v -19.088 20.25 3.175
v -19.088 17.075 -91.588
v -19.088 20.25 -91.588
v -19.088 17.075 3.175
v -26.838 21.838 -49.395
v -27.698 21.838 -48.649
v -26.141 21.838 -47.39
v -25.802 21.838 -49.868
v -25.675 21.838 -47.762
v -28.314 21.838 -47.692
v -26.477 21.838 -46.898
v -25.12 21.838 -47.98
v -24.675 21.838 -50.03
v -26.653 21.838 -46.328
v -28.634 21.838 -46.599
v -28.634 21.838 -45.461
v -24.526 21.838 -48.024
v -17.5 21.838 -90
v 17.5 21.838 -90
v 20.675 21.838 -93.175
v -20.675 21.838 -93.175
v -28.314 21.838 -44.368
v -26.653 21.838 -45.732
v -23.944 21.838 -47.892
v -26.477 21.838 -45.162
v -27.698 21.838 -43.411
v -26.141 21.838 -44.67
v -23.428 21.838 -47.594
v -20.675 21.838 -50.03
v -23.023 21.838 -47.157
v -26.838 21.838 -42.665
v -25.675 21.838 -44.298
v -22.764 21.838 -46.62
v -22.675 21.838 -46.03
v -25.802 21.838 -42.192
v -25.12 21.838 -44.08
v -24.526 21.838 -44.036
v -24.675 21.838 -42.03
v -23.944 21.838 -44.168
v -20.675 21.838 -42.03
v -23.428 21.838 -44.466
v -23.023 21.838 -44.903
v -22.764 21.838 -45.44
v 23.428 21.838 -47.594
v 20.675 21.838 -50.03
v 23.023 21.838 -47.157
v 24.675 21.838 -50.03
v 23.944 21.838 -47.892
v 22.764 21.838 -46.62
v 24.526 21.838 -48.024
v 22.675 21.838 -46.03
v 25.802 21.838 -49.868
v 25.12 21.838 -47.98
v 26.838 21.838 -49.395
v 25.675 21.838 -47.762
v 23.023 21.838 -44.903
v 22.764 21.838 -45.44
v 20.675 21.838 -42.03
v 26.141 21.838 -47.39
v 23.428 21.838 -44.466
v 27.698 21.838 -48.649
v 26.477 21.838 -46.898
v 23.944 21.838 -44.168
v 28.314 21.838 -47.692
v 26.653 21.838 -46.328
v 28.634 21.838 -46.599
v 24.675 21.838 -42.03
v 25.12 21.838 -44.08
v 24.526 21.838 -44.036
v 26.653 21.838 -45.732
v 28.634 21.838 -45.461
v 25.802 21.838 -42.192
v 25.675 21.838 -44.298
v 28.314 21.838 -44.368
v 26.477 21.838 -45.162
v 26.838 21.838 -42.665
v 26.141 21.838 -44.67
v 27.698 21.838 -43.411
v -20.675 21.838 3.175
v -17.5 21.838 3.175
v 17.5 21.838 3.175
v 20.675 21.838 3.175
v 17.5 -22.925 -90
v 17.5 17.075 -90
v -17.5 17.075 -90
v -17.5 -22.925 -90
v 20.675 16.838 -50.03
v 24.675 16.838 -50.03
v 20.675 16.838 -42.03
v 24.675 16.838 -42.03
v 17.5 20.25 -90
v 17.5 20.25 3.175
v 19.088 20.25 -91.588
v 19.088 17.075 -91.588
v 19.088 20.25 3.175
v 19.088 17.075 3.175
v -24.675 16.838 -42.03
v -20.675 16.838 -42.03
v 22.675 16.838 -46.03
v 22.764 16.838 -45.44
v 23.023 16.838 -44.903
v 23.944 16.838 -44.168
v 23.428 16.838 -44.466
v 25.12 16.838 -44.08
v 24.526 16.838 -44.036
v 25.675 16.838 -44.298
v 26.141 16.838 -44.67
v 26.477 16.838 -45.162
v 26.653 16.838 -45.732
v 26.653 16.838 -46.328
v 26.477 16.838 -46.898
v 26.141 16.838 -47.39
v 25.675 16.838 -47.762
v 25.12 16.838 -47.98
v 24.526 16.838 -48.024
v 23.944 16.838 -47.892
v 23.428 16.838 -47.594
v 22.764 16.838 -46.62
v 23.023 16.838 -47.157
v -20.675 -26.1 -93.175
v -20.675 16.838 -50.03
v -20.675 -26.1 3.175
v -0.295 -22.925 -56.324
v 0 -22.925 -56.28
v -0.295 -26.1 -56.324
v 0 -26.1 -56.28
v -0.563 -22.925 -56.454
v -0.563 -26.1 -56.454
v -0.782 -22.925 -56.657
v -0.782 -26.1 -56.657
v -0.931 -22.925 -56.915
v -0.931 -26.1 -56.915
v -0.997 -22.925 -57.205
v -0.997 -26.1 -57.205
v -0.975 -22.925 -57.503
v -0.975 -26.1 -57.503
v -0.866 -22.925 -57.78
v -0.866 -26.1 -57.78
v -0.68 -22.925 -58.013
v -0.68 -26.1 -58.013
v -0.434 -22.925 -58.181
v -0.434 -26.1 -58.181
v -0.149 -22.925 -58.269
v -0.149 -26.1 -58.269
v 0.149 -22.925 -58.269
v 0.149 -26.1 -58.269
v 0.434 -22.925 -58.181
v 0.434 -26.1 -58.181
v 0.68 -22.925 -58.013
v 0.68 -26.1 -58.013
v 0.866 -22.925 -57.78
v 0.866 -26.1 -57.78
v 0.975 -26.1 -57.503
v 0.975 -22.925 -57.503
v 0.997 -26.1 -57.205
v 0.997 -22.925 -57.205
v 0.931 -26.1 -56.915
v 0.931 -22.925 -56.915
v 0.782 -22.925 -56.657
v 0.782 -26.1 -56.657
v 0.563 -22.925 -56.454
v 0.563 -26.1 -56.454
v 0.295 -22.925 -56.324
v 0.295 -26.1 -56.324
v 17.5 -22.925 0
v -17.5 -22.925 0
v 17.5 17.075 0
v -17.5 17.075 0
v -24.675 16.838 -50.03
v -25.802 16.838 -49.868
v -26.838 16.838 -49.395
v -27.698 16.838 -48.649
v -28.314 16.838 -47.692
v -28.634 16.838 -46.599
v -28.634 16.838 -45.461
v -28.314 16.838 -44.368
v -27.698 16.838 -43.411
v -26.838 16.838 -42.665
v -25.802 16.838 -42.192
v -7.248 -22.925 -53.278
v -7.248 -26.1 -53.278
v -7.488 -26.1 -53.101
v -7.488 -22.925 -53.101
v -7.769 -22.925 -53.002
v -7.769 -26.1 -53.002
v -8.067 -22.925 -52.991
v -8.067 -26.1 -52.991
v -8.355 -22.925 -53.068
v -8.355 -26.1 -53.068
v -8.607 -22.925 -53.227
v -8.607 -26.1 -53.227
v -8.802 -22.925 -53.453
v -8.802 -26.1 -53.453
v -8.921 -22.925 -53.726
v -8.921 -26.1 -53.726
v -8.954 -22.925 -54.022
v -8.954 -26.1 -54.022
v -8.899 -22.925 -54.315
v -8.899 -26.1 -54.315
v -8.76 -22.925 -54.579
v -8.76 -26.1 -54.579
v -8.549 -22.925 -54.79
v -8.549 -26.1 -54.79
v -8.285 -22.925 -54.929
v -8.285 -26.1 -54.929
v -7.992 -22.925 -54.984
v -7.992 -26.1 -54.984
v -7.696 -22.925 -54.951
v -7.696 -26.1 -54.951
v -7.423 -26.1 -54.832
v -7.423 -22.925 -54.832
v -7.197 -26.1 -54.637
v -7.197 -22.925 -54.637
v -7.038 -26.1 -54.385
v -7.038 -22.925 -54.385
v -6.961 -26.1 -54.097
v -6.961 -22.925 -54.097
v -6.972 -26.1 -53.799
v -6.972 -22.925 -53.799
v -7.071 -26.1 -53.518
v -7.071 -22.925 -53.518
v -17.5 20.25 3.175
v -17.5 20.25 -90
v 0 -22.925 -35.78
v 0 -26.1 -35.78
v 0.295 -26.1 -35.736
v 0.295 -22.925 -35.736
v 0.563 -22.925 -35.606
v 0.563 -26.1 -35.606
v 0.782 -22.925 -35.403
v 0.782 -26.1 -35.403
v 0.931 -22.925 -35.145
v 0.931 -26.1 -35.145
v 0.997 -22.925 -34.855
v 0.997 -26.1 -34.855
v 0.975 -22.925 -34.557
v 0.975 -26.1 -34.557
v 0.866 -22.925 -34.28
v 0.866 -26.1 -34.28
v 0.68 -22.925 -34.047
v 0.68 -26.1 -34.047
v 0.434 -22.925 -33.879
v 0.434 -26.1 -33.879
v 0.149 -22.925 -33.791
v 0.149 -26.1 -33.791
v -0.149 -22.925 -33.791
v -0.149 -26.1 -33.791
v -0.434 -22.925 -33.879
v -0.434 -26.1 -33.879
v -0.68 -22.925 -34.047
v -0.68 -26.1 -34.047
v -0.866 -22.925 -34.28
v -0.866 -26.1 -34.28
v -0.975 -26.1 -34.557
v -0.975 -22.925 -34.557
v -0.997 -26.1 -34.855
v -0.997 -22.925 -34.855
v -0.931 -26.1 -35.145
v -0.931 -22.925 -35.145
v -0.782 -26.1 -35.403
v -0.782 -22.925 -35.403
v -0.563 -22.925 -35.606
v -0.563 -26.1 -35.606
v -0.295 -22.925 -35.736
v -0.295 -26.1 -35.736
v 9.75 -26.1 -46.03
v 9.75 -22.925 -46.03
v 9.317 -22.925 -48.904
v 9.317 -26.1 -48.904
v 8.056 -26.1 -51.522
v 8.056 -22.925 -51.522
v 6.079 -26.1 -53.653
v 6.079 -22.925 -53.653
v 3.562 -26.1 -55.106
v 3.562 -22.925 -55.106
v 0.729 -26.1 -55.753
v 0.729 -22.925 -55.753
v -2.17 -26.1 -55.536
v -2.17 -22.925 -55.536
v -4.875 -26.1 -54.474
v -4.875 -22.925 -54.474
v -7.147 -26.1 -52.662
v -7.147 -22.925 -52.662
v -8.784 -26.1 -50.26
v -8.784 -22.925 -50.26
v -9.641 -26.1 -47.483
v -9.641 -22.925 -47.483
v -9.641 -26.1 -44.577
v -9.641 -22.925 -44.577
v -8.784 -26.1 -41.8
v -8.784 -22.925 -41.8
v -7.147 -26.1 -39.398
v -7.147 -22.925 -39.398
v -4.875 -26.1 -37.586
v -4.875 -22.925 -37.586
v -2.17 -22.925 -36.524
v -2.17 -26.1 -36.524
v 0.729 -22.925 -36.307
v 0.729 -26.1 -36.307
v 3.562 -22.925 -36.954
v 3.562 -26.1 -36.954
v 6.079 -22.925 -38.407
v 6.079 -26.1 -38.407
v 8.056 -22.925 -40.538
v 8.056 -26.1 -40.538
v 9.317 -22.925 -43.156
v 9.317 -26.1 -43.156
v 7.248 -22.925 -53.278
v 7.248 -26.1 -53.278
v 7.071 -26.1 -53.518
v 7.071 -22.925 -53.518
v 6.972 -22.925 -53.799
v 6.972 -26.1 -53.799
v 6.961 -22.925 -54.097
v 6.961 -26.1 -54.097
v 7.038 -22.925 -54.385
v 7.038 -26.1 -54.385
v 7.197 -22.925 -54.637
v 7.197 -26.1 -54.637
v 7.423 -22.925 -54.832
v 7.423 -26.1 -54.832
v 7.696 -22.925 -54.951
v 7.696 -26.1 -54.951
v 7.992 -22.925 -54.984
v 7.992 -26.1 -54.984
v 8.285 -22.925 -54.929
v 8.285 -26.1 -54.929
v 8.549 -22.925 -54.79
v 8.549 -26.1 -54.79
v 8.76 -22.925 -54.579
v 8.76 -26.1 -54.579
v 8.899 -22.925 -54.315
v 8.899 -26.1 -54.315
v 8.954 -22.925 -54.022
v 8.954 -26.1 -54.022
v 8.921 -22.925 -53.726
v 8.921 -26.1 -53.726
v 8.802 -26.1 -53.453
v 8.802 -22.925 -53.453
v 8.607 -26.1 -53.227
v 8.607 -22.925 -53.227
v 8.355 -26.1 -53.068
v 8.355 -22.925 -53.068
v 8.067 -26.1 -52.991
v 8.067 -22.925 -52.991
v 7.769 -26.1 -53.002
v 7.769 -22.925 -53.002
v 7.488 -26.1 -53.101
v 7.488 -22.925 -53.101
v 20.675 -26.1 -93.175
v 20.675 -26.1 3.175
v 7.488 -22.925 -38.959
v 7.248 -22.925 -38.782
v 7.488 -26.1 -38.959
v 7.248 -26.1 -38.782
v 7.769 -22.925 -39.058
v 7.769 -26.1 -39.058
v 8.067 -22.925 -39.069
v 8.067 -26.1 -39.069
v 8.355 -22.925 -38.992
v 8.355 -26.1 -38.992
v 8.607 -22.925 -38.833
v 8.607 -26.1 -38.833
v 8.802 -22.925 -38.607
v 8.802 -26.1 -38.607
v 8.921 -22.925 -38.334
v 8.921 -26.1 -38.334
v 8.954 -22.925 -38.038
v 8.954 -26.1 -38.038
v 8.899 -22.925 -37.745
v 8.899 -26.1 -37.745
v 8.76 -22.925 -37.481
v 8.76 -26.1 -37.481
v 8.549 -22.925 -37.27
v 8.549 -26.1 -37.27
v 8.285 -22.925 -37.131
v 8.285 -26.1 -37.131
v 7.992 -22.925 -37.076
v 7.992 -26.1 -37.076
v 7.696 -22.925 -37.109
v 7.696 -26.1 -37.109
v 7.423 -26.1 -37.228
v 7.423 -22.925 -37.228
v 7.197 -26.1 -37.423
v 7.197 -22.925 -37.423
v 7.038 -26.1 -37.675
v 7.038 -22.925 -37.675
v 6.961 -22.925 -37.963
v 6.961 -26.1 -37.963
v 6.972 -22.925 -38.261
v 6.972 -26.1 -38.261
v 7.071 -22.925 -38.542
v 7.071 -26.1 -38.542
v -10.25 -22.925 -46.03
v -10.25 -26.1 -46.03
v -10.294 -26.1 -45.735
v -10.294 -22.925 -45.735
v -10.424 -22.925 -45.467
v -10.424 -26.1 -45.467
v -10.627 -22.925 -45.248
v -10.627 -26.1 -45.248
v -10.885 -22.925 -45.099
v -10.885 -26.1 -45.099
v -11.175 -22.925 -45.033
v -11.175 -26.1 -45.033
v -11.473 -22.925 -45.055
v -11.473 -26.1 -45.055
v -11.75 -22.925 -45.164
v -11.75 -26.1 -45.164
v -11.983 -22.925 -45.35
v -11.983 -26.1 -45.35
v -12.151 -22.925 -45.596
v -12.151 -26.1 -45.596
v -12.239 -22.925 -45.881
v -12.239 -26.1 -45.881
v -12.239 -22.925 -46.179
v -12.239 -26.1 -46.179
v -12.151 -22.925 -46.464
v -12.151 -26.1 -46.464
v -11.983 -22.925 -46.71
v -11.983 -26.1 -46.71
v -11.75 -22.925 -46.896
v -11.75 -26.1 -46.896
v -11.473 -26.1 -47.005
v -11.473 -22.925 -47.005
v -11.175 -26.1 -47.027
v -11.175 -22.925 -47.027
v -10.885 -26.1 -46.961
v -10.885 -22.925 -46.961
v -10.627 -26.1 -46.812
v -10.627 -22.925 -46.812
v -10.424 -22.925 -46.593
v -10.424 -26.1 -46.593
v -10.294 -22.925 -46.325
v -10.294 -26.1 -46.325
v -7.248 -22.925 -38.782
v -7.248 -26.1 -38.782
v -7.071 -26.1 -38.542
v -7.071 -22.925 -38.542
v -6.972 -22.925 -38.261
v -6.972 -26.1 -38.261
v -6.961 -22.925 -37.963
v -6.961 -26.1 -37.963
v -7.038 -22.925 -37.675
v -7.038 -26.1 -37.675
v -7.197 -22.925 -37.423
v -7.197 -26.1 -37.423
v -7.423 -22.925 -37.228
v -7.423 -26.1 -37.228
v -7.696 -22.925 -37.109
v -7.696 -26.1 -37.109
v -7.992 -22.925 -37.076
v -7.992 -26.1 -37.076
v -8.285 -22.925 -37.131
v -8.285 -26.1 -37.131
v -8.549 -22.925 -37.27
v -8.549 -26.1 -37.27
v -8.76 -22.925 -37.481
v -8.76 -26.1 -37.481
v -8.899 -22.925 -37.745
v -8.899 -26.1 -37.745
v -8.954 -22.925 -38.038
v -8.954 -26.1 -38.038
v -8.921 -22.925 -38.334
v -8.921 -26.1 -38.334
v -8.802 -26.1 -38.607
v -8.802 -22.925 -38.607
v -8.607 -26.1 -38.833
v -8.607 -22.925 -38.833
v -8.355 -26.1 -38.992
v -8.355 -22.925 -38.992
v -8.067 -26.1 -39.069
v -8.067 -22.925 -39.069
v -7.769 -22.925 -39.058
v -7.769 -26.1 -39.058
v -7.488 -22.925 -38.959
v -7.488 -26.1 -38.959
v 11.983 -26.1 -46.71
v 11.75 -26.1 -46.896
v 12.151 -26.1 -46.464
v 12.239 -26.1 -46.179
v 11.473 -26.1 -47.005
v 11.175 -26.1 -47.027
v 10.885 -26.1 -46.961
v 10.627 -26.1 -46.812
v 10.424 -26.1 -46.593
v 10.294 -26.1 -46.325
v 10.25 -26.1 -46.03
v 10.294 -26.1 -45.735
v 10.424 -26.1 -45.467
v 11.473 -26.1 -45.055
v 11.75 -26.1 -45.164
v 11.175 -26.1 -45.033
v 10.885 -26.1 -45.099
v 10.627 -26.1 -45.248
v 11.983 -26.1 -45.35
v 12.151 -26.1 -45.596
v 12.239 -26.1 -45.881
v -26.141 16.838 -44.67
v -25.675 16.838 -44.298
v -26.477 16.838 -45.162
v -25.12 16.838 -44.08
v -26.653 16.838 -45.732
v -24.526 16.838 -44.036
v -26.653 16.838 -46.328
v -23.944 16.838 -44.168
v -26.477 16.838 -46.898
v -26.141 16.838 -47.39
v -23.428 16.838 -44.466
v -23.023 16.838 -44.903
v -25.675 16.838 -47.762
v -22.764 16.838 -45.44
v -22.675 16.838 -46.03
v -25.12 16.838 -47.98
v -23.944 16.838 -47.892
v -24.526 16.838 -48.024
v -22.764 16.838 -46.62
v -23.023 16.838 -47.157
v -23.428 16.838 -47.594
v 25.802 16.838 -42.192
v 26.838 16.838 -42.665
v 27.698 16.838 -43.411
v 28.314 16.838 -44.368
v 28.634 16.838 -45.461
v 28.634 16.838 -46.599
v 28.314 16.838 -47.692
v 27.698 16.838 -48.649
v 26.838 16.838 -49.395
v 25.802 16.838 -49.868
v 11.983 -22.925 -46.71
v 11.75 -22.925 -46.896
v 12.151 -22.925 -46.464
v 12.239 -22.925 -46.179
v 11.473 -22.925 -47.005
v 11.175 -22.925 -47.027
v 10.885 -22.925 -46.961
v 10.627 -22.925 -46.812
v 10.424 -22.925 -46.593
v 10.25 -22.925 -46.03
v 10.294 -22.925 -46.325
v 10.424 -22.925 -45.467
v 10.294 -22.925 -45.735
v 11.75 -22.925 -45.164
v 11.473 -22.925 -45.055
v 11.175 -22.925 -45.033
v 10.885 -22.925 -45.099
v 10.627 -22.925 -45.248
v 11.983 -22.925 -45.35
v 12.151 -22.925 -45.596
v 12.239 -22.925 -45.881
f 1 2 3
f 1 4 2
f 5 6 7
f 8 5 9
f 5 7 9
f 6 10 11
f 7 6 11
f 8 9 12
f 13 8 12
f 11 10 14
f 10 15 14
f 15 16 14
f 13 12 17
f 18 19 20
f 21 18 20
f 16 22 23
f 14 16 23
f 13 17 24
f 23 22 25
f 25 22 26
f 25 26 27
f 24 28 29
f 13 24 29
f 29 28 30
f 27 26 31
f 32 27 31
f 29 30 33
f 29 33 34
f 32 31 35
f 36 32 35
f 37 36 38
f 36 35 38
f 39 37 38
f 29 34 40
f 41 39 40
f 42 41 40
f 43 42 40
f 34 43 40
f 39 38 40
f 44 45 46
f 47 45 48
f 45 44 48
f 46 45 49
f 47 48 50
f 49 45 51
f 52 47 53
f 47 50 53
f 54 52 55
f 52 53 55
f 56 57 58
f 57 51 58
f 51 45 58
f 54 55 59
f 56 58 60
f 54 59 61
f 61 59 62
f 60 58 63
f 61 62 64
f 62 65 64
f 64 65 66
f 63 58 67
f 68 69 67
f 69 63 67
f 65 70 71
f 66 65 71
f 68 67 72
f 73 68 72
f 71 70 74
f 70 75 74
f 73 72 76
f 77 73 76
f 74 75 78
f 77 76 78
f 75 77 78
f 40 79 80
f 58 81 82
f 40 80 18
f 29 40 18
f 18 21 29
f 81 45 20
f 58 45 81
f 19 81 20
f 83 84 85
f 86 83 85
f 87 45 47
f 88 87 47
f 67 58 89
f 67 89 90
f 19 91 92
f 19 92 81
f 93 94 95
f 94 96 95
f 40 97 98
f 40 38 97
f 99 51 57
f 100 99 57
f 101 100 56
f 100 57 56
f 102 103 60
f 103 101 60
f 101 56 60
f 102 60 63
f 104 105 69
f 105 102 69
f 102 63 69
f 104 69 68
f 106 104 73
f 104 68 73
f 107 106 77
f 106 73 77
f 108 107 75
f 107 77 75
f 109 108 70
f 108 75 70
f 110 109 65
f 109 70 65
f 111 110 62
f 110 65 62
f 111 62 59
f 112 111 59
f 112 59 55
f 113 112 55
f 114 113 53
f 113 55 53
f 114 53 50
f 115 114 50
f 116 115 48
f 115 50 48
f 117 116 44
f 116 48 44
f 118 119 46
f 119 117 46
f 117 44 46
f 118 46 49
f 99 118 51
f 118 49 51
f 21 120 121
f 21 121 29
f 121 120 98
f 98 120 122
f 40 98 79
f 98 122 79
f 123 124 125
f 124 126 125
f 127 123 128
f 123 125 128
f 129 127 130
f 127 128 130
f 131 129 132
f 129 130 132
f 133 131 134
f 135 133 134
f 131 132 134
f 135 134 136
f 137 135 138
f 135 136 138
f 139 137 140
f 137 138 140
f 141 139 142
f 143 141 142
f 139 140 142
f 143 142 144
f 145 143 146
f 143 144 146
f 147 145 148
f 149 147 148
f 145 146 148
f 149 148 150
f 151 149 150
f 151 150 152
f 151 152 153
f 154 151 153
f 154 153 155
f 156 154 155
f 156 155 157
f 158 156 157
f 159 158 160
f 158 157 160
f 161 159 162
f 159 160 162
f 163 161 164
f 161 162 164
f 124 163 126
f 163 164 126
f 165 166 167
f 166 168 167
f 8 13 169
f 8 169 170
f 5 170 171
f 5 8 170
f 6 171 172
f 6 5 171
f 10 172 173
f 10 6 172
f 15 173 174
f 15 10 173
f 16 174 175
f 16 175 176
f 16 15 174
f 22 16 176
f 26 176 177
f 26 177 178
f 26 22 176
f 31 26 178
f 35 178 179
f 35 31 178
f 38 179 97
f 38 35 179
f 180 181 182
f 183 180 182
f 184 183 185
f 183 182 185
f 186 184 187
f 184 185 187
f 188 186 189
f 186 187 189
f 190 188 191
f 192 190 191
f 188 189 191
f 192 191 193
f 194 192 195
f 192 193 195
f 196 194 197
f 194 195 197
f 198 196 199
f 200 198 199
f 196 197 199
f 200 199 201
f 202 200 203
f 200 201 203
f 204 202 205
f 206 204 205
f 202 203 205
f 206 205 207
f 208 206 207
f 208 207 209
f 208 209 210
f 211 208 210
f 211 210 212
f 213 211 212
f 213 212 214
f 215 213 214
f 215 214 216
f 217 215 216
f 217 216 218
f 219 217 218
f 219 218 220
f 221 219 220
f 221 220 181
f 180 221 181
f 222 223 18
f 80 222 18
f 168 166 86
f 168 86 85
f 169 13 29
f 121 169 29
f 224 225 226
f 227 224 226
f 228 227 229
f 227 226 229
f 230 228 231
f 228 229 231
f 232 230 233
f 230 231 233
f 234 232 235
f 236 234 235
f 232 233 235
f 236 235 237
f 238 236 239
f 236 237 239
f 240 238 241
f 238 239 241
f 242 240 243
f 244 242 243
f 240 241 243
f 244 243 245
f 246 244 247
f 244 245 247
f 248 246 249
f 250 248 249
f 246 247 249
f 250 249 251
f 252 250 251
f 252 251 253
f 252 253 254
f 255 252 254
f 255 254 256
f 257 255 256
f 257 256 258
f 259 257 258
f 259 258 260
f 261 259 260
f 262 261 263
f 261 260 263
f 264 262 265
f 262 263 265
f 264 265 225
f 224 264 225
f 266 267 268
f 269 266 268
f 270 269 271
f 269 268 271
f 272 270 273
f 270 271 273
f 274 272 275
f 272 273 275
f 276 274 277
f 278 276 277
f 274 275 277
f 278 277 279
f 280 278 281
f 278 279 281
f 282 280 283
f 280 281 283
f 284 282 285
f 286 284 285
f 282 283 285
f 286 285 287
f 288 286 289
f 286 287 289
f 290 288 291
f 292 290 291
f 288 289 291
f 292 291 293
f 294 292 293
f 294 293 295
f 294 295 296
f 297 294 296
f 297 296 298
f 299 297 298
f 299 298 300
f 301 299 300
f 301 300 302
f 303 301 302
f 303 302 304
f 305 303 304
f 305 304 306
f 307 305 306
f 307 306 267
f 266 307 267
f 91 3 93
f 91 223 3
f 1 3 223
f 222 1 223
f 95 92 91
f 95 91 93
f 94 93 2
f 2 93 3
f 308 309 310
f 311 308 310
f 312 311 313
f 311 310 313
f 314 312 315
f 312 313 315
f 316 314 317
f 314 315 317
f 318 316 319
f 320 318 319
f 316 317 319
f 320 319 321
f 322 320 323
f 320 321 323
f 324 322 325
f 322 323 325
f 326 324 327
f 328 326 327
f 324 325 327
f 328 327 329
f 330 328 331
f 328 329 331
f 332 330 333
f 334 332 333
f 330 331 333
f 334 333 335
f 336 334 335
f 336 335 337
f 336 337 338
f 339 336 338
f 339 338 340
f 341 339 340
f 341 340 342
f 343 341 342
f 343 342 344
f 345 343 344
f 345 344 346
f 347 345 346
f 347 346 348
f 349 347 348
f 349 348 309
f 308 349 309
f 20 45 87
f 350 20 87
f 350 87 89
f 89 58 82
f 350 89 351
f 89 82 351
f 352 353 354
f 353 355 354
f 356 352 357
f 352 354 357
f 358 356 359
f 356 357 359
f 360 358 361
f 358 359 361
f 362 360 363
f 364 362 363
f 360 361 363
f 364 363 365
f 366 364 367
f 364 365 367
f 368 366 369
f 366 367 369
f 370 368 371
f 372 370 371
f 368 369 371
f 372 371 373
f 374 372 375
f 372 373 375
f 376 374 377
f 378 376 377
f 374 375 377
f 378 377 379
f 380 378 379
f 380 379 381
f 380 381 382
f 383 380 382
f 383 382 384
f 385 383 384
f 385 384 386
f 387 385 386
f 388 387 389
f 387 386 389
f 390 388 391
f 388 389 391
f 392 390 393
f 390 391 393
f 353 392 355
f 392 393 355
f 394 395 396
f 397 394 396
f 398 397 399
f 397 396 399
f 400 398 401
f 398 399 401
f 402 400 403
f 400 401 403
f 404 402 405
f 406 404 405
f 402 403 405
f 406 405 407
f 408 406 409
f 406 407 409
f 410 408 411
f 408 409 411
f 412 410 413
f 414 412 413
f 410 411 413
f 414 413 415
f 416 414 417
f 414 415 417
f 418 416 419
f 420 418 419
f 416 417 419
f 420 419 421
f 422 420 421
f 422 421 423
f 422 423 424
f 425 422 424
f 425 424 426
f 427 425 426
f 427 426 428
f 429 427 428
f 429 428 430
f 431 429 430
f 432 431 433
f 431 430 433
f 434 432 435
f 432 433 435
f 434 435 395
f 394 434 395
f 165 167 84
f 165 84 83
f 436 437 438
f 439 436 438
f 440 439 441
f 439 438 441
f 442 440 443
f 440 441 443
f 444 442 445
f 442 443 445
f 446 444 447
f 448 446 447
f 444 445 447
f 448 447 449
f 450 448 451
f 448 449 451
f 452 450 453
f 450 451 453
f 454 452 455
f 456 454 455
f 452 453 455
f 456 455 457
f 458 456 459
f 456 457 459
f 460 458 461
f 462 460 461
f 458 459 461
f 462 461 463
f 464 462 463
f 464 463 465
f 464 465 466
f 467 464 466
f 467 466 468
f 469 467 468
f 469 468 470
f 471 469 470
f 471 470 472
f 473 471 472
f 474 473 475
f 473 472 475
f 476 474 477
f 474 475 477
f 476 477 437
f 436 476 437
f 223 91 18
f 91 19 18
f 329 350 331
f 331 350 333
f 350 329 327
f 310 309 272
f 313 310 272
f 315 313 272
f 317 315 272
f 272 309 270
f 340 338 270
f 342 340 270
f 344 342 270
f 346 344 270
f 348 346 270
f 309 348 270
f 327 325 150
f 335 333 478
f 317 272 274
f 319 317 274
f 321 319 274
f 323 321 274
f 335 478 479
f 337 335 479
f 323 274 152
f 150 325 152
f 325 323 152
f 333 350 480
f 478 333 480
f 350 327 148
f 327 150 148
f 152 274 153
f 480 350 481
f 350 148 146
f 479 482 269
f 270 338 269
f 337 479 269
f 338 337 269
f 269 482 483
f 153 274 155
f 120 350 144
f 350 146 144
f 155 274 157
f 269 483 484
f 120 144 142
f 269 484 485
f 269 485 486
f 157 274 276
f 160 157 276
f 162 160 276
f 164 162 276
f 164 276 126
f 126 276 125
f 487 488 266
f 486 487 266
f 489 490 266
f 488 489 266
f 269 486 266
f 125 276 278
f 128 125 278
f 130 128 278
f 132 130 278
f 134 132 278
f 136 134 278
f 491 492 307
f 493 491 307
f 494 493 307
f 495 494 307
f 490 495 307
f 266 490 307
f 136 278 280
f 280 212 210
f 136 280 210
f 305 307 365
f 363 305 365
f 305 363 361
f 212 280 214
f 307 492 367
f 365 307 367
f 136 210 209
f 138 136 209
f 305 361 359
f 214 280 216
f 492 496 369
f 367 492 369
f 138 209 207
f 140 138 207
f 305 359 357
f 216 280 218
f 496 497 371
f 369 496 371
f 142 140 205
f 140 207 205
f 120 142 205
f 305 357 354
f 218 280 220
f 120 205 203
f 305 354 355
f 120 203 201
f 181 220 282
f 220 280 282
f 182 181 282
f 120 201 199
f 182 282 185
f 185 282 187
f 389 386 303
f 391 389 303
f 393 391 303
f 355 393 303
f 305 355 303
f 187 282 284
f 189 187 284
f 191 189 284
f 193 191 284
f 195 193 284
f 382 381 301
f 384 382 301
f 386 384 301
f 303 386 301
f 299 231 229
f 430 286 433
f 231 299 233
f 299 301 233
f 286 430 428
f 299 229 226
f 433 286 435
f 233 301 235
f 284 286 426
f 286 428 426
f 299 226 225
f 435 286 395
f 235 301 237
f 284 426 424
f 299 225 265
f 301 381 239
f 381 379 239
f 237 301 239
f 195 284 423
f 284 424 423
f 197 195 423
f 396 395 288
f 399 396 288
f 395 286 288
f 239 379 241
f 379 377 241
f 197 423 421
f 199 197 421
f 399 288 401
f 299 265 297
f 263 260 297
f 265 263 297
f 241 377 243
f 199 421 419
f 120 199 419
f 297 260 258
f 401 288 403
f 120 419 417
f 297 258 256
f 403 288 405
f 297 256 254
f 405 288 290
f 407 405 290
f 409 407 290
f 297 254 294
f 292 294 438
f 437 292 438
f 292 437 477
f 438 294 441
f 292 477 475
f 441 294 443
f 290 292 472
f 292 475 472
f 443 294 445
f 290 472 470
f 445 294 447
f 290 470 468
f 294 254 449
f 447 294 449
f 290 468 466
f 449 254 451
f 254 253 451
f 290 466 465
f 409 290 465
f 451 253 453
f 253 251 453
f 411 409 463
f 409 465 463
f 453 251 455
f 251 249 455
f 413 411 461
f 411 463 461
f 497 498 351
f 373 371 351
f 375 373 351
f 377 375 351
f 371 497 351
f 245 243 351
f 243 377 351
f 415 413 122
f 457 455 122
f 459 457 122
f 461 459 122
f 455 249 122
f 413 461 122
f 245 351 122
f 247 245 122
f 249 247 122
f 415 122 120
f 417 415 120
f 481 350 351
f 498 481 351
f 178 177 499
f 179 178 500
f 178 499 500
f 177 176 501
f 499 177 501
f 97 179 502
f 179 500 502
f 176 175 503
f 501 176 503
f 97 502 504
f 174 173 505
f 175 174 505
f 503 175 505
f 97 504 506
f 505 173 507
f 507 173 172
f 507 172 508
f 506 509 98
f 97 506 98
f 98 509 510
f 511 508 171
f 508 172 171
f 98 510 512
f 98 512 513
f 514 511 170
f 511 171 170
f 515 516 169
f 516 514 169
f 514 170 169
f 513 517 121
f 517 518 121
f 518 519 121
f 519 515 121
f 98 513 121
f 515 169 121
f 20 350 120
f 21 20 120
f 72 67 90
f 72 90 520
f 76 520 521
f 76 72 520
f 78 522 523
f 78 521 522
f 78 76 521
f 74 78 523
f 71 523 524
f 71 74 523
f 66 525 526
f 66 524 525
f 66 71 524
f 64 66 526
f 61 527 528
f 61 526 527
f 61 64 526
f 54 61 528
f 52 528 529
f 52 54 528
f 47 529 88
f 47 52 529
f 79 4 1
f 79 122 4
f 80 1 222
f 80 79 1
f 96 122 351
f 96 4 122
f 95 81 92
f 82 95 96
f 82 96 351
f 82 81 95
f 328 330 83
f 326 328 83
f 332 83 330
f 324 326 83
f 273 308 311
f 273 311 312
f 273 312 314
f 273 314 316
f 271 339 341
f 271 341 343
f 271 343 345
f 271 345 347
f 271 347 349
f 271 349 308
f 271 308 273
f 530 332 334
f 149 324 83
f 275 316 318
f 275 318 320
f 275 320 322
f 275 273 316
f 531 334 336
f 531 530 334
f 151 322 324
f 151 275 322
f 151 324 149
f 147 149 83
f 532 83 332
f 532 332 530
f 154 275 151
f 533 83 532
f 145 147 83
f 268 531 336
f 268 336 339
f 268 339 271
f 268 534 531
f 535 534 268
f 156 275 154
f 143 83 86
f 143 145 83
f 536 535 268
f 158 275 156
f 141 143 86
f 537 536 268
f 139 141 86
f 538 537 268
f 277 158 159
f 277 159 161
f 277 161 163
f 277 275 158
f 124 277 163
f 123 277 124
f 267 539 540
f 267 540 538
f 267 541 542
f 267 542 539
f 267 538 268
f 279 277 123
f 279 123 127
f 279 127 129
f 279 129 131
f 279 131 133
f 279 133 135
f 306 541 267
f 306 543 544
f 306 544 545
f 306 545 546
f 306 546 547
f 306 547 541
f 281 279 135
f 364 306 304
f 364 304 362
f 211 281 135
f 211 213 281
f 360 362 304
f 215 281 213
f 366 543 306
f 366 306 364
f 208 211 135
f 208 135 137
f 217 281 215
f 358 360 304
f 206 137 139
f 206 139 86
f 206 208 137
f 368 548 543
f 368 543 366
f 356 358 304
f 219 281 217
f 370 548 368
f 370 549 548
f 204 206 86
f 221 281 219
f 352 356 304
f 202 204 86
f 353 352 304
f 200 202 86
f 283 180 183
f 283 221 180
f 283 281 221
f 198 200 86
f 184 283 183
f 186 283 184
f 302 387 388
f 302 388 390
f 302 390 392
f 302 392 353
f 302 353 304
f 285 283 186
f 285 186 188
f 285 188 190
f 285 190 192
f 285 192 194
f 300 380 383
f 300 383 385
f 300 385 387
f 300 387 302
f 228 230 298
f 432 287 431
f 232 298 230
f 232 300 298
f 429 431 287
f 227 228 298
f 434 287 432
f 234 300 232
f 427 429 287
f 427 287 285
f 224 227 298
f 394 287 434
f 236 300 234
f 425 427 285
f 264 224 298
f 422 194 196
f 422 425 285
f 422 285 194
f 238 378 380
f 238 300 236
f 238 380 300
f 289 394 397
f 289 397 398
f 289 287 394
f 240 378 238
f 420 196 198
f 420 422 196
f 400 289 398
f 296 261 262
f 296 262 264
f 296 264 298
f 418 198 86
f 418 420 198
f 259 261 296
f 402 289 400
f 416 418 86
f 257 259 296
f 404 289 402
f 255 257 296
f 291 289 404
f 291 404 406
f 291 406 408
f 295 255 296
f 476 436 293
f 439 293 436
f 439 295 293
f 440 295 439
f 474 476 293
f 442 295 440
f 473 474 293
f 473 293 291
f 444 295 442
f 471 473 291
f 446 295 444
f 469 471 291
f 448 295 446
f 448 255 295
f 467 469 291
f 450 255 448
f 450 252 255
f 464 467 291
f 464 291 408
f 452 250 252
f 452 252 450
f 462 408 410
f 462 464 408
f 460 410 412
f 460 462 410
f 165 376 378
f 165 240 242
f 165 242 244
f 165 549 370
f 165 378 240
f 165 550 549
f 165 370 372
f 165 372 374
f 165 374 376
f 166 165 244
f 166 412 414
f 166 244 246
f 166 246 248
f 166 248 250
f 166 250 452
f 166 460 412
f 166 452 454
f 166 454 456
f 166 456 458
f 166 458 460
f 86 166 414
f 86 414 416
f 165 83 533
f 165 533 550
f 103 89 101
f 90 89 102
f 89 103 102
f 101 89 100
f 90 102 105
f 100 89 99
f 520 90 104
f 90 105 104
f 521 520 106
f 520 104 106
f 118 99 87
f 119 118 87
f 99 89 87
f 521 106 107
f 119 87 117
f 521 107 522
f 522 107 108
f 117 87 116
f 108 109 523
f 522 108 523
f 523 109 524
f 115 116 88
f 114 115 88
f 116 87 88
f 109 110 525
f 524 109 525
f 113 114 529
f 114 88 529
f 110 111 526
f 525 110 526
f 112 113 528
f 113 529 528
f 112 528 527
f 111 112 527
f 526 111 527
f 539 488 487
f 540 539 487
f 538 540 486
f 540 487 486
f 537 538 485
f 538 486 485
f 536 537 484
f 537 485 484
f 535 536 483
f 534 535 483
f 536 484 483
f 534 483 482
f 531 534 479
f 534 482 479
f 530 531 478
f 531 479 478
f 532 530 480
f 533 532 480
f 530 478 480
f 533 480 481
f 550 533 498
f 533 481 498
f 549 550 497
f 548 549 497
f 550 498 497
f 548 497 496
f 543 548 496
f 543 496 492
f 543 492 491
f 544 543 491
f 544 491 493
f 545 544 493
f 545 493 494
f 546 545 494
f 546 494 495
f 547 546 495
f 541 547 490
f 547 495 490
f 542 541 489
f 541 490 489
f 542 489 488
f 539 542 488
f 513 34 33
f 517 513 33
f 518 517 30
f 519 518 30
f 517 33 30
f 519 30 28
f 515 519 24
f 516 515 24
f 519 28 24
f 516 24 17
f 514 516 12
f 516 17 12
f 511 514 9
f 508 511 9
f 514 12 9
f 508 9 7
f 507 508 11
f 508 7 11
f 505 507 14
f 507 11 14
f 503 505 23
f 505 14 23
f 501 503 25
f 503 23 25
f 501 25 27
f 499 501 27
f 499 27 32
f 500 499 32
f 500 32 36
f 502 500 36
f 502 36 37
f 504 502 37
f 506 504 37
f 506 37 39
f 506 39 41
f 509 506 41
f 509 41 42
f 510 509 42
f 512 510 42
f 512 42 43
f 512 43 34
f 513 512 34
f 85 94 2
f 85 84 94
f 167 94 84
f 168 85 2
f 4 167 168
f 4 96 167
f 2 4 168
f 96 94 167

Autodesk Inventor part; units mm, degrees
ref_plane "YZ Plane" through (0, 0, 0) normal (1, 0, 0) x (0, 1, 0)
sketch "Sketch1" plane through (0, 0, 0) normal (0, 0, 1) x (1, 0, 0)
  circle A0 centre (0, 0) radius 14.925 construction
  line L0 (-5.7359, -22.925) -> (4.2584, -22.925) construction
  line L1 (0, -14.925) -> (3.9694, -14.925) construction
  line L2 (-17.5, 17.075) -> (17.5, 17.075)
  line L3 (17.5, 17.075) -> (17.5, -22.925)
  line L4 (17.5, -22.925) -> (-17.5, -22.925)
  line L5 (-17.5, -22.925) -> (-17.5, 17.075)
  line L6 (0, 31.425) -> (0, -35.6875) projected
  line L7 (20.675, 21.8375) -> (20.675, -26.1)
  line L8 (20.675, -26.1) -> (-20.675, -26.1)
  line L9 (-20.675, -26.1) -> (-20.675, 21.8375)
  line L10 (-17.5, 17.075) -> (-19.0875, 17.075)
  line L11 (-19.0875, 17.075) -> (-19.0875, 20.25)
  line L12 (17.5, 17.075) -> (19.0875, 17.075)
  line L13 (19.0875, 17.075) -> (19.0875, 20.25)
  line L14 (17.5, 20.25) -> (17.5, 21.8375)
  line L15 (-17.5, 20.25) -> (-17.5, 21.8375)
  line L16 (-19.0875, 20.25) -> (-17.5, 20.25)
  line L17 (-17.5, 21.8375) -> (-20.675, 21.8375)
  line L18 (19.0875, 20.25) -> (17.5, 20.25)
  line L19 (17.5, 21.8375) -> (20.675, 21.8375)
  line L20 (-17.5, 21.8375) -> (17.5, 21.8375)
  dimension "d0" = 29.85
  dimension "d1" = 8
  dimension "d2" = 40
  dimension "d3" = 35
  dimension "d5" = 3.175
  dimension "d6" = 3.175
  dimension "d7" = 3.175
  dimension "d10" = 3.175
  dimension "d11" = 1.5875
  dimension "d12" = 1.5875
extrude "Extrusion1" add sketch "Sketch1" against normal blind 90 contours L5 L4 L6 L8 L9 L17 L15 L16 L11 L10 | L12 L13 L18 L14 L19 L7 L8 L6 L4 L3
extrude "Extrusion2" add sketch "Sketch1" along normal blind 3.175 contours L2 L6 L4 L5 | L5 L4 L6 L8 L9 L17 L15 L16 L11 L10 | L2 L3 L4 L6 | L12 L13 L18 L14 L19 L7 L8 L6 L4 L3
sketch "Sketch2" plane through (0, 0, -90) normal (0, 0, -1) x (-1, 0, 0)
  line L0 (19.0875, 17.075) -> (17.5, 17.075) projected
  line L1 (17.5, 17.075) -> (17.5, -22.925) projected
  line L2 (17.5, -22.925) -> (-17.5, -22.925) projected
  line L3 (-17.5, -22.925) -> (-17.5, 17.075) projected
  line L4 (-17.5, 17.075) -> (-19.0875, 17.075) projected
  line L5 (-19.0875, 17.075) -> (-19.0875, 20.25) projected
  line L6 (-19.0875, 20.25) -> (-17.5, 20.25) projected
  line L7 (-17.5, 20.25) -> (-17.5, 21.8375) projected
  line L8 (-17.5, 21.8375) -> (-20.675, 21.8375) projected
  line L9 (-20.675, 21.8375) -> (-20.675, -26.1) projected
  line L10 (-20.675, -26.1) -> (20.675, -26.1) projected
  line L11 (20.675, -26.1) -> (20.675, 21.8375) projected
  line L12 (20.675, 21.8375) -> (17.5, 21.8375) projected
  line L13 (17.5, 21.8375) -> (17.5, 20.25) projected
  line L14 (17.5, 20.25) -> (19.0875, 20.25) projected
  line L15 (19.0875, 20.25) -> (19.0875, 17.075) projected
  line L16 (-17.5, 21.8375) -> (17.5, 21.8375)
  line L17 (-17.5, 20.25) -> (17.5, 20.25)
  line L18 (-17.5, 17.075) -> (17.5, 17.075)
  point P0 (0, 0)
extrude "Extrusion3" add sketch "Sketch2" along normal blind 3.175
extrude "Extrusion4" cut sketch "Sketch2" along normal blind 1.5875 contours L0 L18 L4 L5 L6 L17 L14 L15
sketch "Sketch3" plane through (-17.5, -22.925, 0) normal (0, 1, 0) x (1, 0, 0)
  line L0 (-3.175, 93.175) -> (-3.175, -3.175) projected
  line L1 (38.175, 93.175) -> (-3.175, 93.175) projected
  line L2 (38.175, 93.175) -> (38.175, -3.175) projected
  line L3 (-3.175, -3.175) -> (38.175, -3.175) projected
  line L4 (-3.175, 93.175) -> (-3.175, -3.175) construction
  line L5 (-3.175, 45) -> (38.175, 45) construction
  line L6 (38.175, 93.175) -> (38.175, -3.175) construction
  line L7 (-3.175, -3.175) -> (38.175, -3.175) construction
  line L8 (17.5, -3.175) -> (17.5, 93.175) construction
  line L9 (38.175, 93.175) -> (-3.175, 93.175) construction
  circle A0 centre (17.5, 46.03) radius 9.75
  circle A1 centre (17.5, 46.03) radius 12.75 construction
  line L10 (17.5, 58.78) -> (17.5, 55.78) construction
  line L11 (17.5, 57.28) -> (18.611, 57.28) construction
  point P0 (17.5, 0)
  dimension "d22" = 19.5
  dimension "d23" = 25.5
  dimension "d21" = 1.03
extrude "Extrusion5" cut sketch "Sketch3" against normal up to next contours A0
hole "Hole1" at (0, -22.925, -57.28) direction (0, -1, 0) diameter 2 depth 8 tip angle 118
ref_plane "Work Plane1" through (0, -22.925, 3.175) normal (1, 0, 0) x (0, 0, -1)
ref_plane "Work Plane2" through (-20.675, -22.925, -45) normal (0, 0, -1) x (1, 0, 0)
pattern_circular "Circular Pattern1" count 8 over 360 about axis through (0, -26.1, -46.03) along (0, 1, 0) of "Hole1"
sketch "Sketch4" plane through (-17.5, 21.8375, -90) normal (0, 1, 0) x (1, 0, 0)
  circle A0 centre (25.455, -36.015) radius 1 projected
  circle A1 centre (28.75, -43.97) radius 1 projected
  circle A2 centre (25.455, -51.925) radius 1 projected
  circle A3 centre (17.5, -55.22) radius 1 projected
  circle A4 centre (9.545, -51.925) radius 1 projected
  circle A5 centre (6.25, -43.97) radius 1 projected
  circle A6 centre (9.545, -36.015) radius 1 projected
  circle A7 centre (17.5, -32.72) radius 1 projected
  circle A8 centre (17.5, -43.97) radius 9.75 projected
  line L0 (35, -90) -> (0, -90) projected
  line L1 (35, -90) -> (35, 0) projected
  line L2 (0, 0) -> (35, 0) projected
  line L3 (0, -90) -> (0, 0) projected
  line L4 (0, 0) -> (0, -93.175) projected
  line L5 (0, 0) -> (35, 0) projected
  line L6 (35, 0) -> (35, -93.175) projected
  line L7 (38.175, -93.175) -> (35, -93.175) projected
  line L8 (38.175, 3.175) -> (38.175, -93.175) projected
  line L9 (-3.175, 3.175) -> (38.175, 3.175) projected
  line L10 (-3.175, 3.175) -> (-3.175, -93.175) projected
  line L11 (0, -93.175) -> (-3.175, -93.175) projected
  circle A9 centre (-7.175, -43.97) radius 2
  line L12 (17.5, -43.97) -> (-7.175, -43.97) construction
  arc A10 (-7.175, -39.97) -> (-7.175, -47.97) centre (-7.175, -43.97) ccw
  line L13 (-7.175, -47.97) -> (-3.175, -47.97)
  line L14 (-7.175, -39.97) -> (-3.175, -39.97)
  line L15 (-3.175, 3.175) -> (-3.175, -93.175) projected
  point P0 (17.5, -90)
  dimension "d38" = 4
  dimension "d39" = 4
  dimension "d40" = 2
extrude "Extrusion6" add sketch "Sketch4" against normal blind 5 contours L13 A10 L14 L10
mirror "Mirror1" about plane through (0, 0, 0) normal (1, 0, 0) of "Extrusion6"
equation "\"d5\" = d4"
equation "\"d6\" = d4"
equation "\"d7\" = d4"
equation "\"d12\" = d11"
equation "\"d4\" = 3.175"
properties part number "Lead Box" material "Lead"
